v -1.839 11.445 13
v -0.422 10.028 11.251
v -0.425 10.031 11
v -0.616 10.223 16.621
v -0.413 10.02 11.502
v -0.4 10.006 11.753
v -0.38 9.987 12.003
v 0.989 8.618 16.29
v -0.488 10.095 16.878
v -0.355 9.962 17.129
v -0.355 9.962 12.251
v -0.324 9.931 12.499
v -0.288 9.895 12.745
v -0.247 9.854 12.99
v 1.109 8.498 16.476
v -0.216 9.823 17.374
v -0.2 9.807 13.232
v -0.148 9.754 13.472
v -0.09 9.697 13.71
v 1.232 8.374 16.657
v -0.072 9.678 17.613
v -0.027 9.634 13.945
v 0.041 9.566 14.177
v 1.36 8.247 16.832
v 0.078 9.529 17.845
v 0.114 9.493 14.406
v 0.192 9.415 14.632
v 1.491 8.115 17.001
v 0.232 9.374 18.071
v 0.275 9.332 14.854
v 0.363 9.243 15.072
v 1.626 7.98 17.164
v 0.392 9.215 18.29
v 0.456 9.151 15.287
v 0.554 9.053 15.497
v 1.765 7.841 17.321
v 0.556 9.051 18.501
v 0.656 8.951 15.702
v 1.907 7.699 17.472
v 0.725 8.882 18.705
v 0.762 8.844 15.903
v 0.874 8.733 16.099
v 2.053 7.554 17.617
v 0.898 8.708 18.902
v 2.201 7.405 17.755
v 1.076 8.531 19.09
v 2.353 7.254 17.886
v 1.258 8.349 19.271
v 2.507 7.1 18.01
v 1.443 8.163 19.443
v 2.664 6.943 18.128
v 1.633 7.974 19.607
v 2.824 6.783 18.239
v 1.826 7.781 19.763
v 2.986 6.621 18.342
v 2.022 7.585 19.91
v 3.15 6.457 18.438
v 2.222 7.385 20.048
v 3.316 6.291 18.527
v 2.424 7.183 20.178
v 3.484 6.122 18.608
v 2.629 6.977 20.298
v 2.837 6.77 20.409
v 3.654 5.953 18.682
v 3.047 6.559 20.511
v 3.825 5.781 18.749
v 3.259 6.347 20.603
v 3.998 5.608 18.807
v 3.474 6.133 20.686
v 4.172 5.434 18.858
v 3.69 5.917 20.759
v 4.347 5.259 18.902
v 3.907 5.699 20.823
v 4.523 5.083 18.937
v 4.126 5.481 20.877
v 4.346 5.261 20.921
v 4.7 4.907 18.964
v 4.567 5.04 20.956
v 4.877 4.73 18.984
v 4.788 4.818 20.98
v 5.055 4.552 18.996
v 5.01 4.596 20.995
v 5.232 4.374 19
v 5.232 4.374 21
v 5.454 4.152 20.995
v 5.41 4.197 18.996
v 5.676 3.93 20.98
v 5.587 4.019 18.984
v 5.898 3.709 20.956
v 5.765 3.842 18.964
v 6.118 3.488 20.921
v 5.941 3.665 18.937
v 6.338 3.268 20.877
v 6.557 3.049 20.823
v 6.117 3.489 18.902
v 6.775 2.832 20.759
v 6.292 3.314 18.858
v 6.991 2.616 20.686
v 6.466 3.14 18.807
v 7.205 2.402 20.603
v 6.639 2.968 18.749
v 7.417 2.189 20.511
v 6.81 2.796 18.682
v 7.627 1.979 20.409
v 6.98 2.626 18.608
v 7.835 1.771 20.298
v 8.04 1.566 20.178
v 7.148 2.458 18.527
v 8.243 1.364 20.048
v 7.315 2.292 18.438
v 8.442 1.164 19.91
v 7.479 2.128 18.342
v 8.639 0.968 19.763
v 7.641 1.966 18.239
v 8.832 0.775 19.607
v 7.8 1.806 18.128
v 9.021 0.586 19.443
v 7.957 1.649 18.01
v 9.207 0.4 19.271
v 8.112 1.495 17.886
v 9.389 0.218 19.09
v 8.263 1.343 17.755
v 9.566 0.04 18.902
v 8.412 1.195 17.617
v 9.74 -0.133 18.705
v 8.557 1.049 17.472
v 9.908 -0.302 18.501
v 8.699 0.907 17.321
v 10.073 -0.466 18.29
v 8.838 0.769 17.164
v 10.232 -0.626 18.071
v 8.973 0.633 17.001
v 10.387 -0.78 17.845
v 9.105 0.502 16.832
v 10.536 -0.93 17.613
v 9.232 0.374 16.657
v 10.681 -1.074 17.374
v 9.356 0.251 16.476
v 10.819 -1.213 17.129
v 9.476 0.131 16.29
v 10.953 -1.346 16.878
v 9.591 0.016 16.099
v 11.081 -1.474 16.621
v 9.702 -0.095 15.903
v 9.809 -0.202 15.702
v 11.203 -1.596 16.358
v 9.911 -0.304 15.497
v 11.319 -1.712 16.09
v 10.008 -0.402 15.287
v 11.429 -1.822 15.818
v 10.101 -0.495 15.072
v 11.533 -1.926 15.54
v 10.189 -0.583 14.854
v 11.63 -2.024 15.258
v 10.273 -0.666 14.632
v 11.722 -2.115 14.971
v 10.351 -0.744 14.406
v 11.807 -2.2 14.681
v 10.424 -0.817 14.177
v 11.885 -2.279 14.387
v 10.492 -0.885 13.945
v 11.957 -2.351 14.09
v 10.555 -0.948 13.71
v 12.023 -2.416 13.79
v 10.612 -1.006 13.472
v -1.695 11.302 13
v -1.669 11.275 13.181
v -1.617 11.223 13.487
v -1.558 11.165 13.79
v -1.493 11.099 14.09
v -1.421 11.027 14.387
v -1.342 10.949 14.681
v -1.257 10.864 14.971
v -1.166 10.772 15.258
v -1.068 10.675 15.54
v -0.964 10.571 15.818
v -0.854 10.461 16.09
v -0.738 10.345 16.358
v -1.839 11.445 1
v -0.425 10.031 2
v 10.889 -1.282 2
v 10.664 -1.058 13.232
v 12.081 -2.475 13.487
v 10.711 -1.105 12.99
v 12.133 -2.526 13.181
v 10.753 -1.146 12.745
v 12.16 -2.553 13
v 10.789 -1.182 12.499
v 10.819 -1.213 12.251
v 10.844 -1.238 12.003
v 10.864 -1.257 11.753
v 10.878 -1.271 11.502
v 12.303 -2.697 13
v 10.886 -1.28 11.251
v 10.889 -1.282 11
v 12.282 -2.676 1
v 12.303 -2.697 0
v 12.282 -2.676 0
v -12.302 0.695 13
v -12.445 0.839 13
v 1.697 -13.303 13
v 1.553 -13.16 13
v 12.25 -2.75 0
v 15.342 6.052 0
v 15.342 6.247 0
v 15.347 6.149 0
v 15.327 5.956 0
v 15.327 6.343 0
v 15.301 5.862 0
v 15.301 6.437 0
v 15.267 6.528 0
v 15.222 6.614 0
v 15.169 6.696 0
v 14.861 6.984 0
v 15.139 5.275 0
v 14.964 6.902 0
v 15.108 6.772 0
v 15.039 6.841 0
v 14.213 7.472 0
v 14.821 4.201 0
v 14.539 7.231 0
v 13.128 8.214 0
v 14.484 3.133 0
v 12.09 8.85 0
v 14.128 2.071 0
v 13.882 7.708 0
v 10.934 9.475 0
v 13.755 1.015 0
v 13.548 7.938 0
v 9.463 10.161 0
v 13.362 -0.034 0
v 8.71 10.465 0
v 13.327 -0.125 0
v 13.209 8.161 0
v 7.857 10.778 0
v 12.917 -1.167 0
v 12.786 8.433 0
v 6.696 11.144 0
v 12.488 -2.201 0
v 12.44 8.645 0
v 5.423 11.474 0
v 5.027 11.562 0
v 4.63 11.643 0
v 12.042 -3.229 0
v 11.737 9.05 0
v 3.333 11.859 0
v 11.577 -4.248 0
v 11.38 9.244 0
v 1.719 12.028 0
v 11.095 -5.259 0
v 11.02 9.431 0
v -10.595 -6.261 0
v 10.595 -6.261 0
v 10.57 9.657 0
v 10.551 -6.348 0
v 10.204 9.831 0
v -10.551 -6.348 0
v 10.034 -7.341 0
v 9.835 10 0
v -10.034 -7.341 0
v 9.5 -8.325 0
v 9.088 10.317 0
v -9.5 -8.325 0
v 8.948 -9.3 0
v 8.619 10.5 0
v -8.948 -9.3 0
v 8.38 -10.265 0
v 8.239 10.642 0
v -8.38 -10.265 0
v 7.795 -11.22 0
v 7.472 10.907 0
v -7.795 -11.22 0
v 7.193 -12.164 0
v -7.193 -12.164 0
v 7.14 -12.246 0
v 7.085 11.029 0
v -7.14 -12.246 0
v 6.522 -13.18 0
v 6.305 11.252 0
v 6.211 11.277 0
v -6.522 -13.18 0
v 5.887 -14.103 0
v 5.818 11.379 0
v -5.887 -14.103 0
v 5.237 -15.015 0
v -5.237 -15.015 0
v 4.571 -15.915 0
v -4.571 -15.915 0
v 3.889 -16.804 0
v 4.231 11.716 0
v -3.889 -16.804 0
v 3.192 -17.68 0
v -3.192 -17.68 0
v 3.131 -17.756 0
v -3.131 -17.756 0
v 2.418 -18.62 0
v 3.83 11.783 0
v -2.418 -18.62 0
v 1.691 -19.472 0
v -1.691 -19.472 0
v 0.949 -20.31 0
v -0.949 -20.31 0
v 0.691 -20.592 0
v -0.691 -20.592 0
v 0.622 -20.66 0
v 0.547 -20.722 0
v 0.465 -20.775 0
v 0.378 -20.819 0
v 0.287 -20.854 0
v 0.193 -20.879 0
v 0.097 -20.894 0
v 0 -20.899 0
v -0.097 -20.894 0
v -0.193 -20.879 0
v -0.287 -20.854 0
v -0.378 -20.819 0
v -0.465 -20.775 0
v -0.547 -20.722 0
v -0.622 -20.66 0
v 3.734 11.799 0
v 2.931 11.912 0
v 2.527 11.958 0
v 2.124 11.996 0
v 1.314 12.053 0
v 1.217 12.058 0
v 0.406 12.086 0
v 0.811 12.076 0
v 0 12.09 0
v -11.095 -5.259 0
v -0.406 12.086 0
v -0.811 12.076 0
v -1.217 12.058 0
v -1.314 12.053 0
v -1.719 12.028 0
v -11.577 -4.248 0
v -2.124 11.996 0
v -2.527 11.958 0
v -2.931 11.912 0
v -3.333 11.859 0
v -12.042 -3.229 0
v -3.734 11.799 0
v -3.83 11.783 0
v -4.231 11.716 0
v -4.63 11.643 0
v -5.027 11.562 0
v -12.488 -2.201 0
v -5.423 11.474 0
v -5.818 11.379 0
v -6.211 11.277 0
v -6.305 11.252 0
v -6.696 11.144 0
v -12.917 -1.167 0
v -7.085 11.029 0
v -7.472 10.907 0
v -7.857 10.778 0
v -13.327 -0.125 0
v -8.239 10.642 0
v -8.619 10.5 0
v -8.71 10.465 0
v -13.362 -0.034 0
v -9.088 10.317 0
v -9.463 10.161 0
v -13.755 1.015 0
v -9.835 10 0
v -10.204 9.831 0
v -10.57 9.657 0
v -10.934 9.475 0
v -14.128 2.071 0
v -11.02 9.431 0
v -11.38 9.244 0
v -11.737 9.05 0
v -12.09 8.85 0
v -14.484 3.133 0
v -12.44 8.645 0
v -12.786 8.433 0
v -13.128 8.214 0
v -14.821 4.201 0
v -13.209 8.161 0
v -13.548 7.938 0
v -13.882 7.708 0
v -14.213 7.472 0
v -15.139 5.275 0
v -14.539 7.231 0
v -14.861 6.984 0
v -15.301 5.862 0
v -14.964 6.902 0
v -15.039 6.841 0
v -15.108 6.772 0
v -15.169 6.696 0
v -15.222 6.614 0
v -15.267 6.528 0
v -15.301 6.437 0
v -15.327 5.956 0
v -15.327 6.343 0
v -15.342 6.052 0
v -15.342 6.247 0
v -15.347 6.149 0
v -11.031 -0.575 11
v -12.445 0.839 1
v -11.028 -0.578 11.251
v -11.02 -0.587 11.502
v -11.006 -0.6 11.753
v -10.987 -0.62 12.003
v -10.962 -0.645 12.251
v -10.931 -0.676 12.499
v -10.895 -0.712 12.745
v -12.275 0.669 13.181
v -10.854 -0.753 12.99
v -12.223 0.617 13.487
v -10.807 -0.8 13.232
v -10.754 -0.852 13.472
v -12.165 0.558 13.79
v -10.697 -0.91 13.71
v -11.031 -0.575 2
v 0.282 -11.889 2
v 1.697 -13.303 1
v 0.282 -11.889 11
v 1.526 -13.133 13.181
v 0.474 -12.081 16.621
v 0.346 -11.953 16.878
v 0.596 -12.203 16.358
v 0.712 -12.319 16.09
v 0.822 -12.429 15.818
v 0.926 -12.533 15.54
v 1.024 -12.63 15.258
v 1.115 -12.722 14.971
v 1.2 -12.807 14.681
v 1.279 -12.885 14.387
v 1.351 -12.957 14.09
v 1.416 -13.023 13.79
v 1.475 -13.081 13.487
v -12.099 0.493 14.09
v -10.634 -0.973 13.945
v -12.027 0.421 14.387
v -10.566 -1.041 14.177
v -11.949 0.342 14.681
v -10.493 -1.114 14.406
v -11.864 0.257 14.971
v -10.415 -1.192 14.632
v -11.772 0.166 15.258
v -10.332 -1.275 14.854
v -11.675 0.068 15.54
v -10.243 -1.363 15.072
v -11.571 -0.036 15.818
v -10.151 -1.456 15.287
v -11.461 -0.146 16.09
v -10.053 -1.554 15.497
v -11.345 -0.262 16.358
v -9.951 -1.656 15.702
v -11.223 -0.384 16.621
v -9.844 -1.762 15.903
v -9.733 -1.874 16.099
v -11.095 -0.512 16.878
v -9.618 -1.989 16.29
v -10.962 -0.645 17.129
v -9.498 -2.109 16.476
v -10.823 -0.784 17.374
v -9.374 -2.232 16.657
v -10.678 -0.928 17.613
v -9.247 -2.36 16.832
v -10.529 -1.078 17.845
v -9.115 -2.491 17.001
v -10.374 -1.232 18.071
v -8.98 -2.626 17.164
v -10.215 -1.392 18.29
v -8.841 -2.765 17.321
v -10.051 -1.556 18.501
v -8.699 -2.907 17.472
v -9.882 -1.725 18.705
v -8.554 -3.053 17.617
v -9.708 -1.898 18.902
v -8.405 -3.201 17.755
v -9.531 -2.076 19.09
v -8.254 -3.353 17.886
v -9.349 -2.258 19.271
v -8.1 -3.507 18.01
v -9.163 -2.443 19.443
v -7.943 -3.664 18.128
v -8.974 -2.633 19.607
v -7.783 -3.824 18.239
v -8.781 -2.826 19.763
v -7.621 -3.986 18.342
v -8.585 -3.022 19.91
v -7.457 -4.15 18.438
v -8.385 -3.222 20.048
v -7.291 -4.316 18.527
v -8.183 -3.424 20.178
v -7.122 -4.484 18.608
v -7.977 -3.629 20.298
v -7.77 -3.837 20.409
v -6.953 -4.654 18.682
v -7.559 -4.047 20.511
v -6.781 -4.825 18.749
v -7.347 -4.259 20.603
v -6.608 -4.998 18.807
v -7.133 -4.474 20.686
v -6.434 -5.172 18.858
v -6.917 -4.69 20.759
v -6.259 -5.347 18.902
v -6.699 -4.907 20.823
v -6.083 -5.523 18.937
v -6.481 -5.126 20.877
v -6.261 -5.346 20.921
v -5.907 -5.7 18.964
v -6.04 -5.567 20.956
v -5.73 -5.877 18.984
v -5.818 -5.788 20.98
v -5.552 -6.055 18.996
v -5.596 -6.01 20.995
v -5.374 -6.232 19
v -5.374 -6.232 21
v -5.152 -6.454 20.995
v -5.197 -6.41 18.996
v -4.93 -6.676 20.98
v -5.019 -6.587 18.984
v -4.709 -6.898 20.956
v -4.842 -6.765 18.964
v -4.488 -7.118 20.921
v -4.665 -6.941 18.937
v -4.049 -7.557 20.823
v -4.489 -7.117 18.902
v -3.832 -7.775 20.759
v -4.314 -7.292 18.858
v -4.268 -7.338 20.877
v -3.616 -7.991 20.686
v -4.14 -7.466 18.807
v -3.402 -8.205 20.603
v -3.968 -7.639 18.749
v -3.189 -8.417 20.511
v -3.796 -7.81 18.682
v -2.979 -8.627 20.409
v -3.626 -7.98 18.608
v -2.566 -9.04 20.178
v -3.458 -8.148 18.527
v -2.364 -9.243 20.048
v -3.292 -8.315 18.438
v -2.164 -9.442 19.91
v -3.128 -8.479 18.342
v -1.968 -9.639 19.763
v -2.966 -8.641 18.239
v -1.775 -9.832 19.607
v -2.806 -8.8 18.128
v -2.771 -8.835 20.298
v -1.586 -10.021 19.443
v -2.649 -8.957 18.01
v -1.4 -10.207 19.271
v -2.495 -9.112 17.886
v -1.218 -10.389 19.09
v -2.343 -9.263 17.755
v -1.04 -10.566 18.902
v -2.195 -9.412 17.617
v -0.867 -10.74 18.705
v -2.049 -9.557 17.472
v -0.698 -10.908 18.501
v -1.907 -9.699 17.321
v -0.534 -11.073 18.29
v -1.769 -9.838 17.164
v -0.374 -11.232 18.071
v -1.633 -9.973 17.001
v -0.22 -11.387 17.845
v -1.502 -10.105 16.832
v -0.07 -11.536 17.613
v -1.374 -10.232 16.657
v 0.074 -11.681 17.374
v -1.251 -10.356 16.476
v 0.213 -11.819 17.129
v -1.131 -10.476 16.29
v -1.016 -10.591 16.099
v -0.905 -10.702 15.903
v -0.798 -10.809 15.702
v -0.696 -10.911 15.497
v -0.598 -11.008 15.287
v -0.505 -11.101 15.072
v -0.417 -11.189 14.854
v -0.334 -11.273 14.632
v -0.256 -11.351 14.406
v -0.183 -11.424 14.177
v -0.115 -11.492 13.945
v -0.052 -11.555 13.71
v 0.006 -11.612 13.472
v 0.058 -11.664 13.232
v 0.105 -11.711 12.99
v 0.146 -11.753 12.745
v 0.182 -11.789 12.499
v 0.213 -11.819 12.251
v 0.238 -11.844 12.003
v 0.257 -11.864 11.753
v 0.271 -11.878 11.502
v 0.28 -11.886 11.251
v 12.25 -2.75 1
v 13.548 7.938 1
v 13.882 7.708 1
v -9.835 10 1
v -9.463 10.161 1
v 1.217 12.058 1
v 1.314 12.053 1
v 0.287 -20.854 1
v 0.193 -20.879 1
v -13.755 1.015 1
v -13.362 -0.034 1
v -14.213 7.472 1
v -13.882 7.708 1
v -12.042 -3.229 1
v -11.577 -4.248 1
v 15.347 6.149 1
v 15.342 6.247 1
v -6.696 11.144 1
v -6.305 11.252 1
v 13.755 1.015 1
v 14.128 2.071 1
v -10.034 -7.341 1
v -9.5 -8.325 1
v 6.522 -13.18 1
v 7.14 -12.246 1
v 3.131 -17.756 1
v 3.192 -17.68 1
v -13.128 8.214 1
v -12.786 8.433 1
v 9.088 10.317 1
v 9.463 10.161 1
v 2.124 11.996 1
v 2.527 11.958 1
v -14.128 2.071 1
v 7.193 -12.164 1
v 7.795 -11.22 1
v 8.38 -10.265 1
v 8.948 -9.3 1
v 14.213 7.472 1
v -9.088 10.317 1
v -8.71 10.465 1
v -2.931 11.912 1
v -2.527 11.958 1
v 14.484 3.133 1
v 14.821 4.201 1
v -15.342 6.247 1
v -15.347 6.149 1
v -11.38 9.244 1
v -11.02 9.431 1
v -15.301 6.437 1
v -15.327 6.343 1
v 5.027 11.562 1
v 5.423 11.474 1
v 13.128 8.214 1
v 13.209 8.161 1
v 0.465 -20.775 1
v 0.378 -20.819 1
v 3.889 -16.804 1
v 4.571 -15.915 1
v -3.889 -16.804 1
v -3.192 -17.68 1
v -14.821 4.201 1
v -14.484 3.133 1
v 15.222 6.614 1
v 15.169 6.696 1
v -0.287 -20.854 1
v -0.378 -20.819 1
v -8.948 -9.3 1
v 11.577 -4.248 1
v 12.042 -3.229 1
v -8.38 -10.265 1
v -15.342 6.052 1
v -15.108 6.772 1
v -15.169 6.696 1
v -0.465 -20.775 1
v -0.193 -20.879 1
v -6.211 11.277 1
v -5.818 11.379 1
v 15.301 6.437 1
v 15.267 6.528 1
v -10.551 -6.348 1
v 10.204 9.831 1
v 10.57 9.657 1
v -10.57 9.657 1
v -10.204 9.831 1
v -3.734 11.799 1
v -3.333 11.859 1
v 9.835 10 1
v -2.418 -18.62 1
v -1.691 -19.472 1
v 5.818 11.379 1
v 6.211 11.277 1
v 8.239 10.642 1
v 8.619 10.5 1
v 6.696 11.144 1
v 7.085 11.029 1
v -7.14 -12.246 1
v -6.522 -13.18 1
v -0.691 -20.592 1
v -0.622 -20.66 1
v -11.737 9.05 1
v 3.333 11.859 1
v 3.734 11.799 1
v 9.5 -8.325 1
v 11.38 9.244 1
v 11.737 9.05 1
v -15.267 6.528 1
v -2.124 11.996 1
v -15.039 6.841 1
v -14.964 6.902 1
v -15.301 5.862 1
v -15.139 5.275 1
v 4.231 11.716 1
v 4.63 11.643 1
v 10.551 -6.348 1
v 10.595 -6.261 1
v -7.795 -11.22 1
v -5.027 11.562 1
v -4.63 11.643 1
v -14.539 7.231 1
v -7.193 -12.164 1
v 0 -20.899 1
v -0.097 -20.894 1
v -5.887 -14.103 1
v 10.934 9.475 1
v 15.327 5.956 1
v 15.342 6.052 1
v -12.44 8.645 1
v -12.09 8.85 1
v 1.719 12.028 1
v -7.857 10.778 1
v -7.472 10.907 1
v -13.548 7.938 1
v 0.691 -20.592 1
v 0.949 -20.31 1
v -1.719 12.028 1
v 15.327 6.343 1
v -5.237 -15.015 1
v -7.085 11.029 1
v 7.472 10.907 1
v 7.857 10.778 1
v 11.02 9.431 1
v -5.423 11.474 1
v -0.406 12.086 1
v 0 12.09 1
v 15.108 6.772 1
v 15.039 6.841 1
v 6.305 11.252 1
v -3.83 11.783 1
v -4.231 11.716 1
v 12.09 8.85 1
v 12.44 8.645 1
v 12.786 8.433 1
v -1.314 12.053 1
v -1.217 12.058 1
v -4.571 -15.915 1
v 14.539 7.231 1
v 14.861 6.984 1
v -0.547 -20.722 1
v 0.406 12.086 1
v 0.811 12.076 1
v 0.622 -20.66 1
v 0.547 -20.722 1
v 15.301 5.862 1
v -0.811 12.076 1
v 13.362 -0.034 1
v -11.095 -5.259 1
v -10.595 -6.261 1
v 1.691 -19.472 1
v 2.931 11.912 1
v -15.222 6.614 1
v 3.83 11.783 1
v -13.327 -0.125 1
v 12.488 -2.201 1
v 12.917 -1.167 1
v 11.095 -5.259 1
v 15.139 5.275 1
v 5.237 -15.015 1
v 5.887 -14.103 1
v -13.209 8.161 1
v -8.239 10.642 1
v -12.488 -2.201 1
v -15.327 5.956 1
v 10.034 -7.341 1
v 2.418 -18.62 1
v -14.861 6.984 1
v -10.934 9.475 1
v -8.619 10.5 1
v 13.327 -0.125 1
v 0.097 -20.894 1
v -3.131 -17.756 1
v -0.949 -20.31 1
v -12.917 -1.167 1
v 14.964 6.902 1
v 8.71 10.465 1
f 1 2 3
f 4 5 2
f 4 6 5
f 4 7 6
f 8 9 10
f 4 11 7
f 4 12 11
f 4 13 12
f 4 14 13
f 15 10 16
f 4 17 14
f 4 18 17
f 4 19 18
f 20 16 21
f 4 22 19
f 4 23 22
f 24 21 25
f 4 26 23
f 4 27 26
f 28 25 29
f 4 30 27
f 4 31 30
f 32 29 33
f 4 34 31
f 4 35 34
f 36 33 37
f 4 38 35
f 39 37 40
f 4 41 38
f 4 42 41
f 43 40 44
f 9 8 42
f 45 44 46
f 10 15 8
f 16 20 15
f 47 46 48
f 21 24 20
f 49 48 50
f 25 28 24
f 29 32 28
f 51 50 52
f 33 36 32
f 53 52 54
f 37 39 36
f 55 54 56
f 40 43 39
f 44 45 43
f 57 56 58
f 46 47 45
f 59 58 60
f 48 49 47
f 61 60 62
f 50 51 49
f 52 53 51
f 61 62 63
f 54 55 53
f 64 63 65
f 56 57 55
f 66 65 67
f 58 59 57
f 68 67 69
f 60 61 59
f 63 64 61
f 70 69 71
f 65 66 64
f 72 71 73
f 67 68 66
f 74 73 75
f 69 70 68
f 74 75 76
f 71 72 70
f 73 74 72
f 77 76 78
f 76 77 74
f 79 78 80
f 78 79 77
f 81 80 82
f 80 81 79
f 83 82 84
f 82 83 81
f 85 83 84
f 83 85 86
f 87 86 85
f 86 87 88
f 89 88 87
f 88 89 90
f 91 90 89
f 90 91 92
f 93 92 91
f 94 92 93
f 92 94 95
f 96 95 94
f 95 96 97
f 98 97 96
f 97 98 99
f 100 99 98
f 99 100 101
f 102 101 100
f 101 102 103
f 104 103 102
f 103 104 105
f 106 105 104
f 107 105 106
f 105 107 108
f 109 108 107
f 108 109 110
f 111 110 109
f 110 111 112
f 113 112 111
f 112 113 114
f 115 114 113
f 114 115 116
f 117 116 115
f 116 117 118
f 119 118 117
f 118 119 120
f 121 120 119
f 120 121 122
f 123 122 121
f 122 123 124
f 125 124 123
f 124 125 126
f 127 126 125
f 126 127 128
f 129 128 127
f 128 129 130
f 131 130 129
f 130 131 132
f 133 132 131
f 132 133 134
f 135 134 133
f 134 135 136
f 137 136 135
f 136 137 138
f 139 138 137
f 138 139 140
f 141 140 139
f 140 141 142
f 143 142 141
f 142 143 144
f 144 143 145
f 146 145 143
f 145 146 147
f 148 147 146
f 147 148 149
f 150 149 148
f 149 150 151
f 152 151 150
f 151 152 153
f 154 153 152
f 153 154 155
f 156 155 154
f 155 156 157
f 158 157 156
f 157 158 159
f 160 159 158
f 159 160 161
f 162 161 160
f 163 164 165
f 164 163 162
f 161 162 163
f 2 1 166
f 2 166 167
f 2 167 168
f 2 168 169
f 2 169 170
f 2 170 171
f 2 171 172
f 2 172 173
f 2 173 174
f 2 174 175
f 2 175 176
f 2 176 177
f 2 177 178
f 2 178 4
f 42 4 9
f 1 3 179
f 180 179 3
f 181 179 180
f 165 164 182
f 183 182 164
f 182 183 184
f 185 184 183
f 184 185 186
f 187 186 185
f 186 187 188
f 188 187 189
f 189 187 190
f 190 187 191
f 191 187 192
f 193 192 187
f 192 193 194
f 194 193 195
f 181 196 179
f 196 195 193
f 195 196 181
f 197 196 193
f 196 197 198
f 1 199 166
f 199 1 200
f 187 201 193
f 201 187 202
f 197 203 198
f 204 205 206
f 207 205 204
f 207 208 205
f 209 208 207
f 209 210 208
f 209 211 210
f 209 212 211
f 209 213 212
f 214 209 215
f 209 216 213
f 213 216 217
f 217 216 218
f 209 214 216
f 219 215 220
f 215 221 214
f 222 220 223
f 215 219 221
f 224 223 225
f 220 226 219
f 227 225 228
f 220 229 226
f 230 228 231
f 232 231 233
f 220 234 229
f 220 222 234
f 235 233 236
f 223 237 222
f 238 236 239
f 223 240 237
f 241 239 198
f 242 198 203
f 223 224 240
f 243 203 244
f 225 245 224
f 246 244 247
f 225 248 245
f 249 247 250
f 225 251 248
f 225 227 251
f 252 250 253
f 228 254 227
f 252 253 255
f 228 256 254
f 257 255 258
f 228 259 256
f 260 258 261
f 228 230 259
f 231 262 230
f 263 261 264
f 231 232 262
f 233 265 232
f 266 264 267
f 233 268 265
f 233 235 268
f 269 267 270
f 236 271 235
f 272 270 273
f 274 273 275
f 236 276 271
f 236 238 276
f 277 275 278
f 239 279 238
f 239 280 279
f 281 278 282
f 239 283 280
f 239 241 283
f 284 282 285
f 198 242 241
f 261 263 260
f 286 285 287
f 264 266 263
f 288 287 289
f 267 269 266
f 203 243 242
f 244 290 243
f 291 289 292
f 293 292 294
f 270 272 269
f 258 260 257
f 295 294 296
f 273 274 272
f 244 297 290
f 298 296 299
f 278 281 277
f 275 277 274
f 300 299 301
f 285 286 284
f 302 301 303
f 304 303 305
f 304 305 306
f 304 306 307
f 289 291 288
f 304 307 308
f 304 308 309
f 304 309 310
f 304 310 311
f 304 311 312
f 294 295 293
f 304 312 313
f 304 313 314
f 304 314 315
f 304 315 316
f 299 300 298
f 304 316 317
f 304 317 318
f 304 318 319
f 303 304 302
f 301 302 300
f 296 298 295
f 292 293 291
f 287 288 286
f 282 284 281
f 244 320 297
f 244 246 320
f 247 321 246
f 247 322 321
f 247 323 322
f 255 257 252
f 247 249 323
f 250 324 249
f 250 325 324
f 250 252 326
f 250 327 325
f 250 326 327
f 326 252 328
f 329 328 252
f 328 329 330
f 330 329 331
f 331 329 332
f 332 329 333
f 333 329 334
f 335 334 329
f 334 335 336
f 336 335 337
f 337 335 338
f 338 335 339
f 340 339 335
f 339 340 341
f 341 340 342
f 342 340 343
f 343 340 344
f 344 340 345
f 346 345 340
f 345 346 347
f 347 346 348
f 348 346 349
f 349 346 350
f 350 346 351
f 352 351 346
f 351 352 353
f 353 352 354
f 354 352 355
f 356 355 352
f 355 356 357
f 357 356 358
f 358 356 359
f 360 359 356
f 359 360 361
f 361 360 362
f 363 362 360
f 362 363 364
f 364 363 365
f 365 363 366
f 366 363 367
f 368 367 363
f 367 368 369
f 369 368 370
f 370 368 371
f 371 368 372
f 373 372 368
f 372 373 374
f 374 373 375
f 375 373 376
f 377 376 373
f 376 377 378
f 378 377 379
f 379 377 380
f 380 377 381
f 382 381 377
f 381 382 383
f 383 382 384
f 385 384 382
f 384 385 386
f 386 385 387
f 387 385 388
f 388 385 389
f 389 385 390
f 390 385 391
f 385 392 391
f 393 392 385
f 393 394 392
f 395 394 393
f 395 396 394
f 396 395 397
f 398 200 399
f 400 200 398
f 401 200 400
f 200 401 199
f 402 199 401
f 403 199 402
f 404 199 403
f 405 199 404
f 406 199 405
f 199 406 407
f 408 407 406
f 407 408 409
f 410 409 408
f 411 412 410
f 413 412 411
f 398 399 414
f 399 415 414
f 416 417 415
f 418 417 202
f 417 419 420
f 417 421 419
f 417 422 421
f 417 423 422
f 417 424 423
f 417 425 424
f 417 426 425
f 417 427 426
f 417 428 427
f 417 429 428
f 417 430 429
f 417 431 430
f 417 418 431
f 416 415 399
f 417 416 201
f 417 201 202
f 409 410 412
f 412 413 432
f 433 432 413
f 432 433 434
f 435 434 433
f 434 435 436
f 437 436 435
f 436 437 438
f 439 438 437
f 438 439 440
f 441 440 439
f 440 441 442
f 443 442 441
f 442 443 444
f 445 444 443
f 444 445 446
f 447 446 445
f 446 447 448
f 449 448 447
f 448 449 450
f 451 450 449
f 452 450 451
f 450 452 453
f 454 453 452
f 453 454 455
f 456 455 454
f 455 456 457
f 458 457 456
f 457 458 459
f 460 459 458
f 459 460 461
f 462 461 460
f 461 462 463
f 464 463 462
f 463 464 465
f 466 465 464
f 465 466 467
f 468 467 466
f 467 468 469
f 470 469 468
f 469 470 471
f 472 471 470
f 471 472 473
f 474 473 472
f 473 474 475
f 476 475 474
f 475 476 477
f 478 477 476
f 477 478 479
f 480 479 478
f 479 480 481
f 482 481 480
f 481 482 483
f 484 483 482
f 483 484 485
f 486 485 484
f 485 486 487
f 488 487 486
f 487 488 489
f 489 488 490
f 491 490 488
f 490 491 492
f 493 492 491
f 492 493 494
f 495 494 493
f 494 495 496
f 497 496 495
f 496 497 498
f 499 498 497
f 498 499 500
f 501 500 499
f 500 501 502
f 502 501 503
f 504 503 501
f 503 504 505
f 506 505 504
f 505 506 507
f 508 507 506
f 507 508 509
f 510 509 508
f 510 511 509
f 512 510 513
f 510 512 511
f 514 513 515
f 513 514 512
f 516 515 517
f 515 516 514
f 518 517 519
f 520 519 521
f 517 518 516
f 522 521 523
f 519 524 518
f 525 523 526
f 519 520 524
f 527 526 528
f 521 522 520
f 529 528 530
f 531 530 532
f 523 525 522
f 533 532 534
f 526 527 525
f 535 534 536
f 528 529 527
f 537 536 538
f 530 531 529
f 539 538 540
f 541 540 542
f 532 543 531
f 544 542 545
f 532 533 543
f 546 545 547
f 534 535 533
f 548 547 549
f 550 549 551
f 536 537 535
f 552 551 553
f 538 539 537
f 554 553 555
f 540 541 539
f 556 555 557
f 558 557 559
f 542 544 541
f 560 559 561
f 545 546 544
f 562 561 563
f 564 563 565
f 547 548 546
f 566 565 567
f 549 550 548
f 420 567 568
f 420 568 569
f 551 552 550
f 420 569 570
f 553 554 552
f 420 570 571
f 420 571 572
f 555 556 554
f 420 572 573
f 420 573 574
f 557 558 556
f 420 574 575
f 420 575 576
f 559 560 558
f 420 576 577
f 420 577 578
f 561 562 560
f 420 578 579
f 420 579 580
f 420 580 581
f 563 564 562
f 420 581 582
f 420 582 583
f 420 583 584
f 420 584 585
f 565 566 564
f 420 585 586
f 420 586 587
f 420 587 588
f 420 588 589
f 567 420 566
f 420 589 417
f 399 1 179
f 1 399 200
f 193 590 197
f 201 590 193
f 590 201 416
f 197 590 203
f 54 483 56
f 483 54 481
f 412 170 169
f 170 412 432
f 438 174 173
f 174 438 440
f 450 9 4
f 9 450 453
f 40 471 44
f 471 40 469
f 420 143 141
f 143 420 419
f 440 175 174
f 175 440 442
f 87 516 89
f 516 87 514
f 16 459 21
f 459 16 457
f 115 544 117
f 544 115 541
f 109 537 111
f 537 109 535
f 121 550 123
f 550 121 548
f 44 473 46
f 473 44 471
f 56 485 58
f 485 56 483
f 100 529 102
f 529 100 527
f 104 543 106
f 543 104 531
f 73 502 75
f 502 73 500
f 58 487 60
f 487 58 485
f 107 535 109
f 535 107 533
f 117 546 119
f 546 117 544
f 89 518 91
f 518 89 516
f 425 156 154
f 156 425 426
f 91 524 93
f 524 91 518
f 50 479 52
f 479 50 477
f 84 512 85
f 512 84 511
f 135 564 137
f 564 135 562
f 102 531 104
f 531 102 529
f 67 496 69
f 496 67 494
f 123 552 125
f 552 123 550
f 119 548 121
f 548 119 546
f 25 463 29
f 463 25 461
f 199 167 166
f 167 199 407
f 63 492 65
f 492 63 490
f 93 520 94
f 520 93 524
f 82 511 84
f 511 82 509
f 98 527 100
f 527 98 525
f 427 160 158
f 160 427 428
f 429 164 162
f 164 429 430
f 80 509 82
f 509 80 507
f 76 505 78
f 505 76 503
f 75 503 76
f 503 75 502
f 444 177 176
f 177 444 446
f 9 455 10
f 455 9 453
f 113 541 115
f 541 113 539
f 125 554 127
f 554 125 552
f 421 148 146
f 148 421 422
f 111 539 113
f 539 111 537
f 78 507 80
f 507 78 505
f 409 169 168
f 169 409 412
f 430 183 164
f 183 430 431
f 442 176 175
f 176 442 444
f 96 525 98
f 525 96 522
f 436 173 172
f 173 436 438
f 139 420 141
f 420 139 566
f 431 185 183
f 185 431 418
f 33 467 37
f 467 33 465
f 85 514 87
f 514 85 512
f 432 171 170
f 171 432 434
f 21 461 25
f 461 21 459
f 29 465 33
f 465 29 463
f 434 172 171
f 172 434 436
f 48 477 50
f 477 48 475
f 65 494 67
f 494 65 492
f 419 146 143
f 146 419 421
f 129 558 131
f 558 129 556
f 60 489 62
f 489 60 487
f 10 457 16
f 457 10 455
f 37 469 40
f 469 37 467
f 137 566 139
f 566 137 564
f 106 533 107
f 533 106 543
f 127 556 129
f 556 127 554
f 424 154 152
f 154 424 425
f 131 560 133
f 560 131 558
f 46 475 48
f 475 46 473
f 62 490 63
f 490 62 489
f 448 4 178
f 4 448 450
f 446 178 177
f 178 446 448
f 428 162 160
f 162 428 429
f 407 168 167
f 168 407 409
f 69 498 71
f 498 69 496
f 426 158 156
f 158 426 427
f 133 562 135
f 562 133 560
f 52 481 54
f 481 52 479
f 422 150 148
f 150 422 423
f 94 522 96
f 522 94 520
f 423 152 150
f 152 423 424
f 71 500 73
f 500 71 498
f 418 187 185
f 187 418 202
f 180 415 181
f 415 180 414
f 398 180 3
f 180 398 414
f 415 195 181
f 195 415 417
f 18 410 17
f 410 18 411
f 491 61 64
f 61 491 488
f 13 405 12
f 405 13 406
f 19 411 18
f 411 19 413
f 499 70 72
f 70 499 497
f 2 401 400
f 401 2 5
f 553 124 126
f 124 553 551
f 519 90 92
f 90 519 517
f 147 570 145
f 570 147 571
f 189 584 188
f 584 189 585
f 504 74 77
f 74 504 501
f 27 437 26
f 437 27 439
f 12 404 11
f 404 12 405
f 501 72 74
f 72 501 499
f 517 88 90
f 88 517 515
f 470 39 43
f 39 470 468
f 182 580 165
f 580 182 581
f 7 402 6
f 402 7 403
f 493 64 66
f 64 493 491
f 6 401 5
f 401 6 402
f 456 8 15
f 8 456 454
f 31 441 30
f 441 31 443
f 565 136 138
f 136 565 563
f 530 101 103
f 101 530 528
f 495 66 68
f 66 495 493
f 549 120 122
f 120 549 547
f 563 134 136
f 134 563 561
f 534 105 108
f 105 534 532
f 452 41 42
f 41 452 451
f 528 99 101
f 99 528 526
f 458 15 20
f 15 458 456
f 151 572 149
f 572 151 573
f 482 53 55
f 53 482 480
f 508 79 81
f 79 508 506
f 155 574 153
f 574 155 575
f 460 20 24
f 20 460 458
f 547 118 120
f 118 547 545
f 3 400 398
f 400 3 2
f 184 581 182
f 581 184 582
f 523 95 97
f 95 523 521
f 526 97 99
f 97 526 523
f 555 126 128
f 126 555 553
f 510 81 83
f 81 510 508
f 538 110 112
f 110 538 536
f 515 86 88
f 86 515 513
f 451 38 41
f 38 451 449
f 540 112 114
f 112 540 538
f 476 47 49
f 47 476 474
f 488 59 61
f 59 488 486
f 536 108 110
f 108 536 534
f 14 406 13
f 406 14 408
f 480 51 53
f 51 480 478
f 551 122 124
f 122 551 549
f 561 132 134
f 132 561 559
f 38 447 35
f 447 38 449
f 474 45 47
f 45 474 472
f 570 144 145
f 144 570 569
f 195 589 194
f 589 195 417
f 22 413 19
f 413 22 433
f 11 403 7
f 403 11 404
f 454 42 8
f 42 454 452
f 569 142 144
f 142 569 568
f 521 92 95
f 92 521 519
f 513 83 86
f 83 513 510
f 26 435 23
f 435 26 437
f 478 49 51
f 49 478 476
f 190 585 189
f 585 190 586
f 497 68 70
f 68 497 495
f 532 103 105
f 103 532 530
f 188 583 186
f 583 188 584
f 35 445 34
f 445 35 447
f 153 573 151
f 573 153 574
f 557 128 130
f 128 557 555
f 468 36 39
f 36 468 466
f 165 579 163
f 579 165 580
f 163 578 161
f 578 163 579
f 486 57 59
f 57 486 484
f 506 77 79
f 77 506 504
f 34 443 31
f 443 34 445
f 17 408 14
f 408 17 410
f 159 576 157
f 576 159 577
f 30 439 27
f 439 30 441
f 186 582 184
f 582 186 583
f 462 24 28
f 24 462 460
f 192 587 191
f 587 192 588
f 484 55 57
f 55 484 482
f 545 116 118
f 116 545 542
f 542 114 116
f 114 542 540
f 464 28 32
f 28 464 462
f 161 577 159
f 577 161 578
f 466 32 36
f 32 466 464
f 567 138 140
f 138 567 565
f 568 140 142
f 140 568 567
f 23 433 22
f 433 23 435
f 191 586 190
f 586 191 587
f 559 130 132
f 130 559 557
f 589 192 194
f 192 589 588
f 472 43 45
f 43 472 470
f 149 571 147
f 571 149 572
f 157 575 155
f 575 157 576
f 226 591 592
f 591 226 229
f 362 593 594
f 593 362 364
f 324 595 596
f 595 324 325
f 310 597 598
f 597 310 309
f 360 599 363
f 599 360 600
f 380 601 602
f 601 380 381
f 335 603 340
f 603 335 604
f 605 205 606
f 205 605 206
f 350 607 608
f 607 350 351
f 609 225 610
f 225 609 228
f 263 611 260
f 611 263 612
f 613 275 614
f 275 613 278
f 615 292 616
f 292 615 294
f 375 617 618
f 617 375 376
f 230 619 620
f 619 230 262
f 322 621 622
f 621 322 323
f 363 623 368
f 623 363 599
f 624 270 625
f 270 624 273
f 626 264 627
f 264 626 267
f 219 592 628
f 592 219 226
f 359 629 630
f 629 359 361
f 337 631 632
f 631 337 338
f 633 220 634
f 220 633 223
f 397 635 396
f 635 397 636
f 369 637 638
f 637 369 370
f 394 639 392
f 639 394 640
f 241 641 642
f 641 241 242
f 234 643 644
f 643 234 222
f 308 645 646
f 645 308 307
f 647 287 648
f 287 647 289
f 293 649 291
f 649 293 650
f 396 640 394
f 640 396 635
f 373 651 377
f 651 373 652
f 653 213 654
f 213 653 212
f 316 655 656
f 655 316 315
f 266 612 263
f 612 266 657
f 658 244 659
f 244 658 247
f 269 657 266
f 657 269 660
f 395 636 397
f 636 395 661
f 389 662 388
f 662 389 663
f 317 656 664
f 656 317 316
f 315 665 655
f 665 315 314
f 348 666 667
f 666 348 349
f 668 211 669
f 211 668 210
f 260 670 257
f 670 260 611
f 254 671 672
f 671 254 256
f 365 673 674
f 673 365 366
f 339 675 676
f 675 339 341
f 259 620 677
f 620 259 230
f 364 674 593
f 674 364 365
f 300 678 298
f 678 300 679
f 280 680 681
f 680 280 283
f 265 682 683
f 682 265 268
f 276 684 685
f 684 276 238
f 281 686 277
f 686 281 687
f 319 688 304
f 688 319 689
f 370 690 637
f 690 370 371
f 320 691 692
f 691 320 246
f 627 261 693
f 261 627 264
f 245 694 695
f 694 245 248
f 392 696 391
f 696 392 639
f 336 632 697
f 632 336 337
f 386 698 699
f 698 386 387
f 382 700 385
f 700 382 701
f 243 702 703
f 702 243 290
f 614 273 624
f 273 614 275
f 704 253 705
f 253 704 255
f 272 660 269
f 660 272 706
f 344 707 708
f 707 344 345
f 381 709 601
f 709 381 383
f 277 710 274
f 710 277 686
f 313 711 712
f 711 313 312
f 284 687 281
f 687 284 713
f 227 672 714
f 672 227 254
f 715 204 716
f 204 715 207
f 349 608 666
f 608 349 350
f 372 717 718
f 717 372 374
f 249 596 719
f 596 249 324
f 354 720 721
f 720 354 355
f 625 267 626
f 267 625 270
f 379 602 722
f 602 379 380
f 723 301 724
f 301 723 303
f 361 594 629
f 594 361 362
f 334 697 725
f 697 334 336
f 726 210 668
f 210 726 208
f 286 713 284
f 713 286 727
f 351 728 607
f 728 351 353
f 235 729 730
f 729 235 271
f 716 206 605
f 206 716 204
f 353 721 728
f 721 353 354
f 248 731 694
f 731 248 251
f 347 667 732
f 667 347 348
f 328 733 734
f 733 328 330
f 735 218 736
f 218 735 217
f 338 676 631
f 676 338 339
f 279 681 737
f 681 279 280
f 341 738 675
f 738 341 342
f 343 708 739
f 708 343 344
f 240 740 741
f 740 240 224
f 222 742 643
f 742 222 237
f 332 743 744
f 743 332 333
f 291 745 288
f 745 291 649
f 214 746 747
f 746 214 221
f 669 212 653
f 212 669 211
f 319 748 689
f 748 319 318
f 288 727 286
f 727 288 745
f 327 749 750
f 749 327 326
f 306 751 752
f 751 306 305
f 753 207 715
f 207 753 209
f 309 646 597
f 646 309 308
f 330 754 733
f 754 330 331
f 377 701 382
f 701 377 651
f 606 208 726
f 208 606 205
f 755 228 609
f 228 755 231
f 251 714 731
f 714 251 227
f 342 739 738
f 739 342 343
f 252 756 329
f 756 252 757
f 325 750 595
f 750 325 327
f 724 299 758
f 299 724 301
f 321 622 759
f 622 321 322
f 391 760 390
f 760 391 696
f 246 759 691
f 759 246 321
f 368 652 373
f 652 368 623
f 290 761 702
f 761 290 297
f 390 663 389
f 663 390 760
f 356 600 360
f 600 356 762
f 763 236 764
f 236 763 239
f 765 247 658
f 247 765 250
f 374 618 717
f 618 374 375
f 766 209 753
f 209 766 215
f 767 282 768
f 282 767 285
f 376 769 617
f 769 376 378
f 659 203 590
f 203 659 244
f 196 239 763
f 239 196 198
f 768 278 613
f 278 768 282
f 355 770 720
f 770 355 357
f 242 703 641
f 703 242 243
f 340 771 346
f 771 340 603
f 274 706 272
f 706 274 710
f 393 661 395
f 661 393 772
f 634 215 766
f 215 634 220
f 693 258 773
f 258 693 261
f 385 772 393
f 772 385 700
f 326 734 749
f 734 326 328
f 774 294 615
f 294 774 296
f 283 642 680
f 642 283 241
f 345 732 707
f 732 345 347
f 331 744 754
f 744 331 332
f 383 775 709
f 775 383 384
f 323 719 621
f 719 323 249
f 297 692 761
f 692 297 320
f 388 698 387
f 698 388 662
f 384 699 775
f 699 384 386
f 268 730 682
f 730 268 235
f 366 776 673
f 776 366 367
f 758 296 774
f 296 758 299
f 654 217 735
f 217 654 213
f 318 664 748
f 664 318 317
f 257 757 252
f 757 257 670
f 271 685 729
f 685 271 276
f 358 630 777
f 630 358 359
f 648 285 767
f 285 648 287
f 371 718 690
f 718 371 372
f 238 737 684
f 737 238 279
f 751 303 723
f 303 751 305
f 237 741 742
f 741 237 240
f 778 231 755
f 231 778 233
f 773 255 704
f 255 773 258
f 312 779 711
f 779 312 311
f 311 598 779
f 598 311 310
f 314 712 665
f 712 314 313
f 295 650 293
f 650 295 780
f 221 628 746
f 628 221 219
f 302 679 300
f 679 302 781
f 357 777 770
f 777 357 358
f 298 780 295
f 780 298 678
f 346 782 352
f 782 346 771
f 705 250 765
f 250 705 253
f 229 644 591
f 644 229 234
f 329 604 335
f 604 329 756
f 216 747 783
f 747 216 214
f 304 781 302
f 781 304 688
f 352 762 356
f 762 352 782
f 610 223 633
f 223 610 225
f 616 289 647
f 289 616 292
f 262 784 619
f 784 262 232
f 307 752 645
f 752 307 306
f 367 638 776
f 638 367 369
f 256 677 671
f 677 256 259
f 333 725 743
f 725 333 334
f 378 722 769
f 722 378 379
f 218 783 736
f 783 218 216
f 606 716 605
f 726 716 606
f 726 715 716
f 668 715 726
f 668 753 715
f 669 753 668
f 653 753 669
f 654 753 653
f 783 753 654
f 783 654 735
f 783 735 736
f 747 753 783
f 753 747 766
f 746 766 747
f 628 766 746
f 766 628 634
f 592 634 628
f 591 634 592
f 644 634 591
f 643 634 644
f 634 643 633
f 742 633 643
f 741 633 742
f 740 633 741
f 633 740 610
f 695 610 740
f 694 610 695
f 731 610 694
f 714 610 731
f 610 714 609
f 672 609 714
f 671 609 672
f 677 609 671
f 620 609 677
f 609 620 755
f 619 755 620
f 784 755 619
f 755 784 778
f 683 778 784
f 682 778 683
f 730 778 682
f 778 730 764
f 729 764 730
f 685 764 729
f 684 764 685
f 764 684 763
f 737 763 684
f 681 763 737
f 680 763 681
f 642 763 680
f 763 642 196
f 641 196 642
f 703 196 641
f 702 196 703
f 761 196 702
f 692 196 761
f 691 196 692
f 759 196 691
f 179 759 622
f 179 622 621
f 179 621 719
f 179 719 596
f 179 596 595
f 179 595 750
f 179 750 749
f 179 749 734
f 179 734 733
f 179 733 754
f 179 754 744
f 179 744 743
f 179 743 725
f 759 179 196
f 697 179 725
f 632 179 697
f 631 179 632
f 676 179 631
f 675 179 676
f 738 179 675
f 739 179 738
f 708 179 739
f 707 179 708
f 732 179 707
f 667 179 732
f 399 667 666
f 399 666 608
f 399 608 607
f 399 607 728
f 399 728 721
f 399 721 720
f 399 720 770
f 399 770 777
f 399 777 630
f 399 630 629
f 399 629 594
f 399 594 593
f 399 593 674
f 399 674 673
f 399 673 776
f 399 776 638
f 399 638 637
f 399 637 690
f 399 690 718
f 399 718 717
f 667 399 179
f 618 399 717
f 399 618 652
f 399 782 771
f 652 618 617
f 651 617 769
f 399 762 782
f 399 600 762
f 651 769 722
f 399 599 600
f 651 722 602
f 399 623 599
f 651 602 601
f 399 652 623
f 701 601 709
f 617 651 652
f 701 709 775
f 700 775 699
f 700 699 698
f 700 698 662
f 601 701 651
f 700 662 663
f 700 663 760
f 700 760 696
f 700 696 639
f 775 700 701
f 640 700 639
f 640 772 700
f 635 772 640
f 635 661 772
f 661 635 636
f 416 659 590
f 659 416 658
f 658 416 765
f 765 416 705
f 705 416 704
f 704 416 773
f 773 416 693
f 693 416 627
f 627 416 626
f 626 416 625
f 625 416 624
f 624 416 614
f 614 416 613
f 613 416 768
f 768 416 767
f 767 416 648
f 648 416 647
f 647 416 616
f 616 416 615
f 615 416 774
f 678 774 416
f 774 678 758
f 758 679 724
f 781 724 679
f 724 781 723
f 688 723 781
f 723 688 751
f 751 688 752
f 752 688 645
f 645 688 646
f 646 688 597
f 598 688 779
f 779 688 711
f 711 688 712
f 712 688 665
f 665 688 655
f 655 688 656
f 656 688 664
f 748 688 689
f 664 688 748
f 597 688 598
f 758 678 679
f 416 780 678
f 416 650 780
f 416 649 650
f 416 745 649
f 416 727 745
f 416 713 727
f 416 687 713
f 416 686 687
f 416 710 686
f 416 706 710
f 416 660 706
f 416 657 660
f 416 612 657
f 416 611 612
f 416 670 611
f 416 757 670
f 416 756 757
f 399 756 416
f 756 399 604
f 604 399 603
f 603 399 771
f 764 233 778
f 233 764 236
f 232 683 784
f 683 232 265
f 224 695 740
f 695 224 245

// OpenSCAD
//	PickPerfect by LoGan McCarthy 3/07/2012 LM
// A thanks to OpenSCAD manual and MakerBlock Customizer Template for the tips and HarlanDMii for Write.scad.
$fn=200;



larg=15;
comp=16; // 14
esp=2;
alt=17;  // 17

//CUSTOMIZER VARIABLES

//	This section is displays the box options
//Pick Thickness 
z_thick = 2.5;	//	[1:Extra Lite, 1.5:Lite, 1.875:Medium, 2.5:Heavy, 3.75:Extra Heavy, 4.375:Extreme!]

//AdvancedGrip Technology
Grip = 0; // [1:Yes, 0:No]


//CUSTOMIZER VARIABLES END


translate([esp*3.5,0-esp*4,0]) // normal
rotate([0,0,45]) 

//anel
difference()
{
	union()
	{
		translate([0-larg/2,0,0])
		cube([larg,comp+esp*2,alt+esp*2-comp/2]);
		rotate([0,90,0])
		translate([0-alt+comp/2-esp,comp/2+esp,0-larg/2])
		cylinder(r=comp/2+esp,h=larg);		
	}
	union()
	{
		translate([0-larg/2-esp,esp,esp])
		cube([larg+esp*2,comp,alt-comp/2]);
		translate([0-larg/2,esp,esp])

		rotate([0,90,0])
		translate([0-alt+comp/2,comp/2,0-esp])
		cylinder(r=comp/2,h=larg+esp*2);		
	}
}


//PickPerfect


scale(v = [.93,.93, z_thick]) {

union() {
color("darkorange")

//error correct
	scale(v = [1,1,.8]) {
minkowski()
{

translate([0,25,0])
	
		intersection() {
			translate([-51,0,0]) cylinder($fn=360,.4,69,69);
			translate([51,0,0]) cylinder($fn=360,.4,69,69);
			translate([0,-38,0]) cylinder($fn=360,.4,25,25);
 }
 cylinder($fn=60,r=1,h=.1);}
}
}

//TOP GRIP
color("gold")

if(Grip==1){
translate([0,0,-1.61]) {
difference() {
translate([0,23,2])
	
		intersection() {
			translate([-51,0,0]) cylinder($fn=260,.2,67,66);
			translate([51,0,0]) cylinder($fn=260,.2,67,66);
			translate([0,-38,0]) cylinder($fn=260,.2,25,24);}

			translate([0,-15,0]) cylinder($fn=260,3,16,25);}
}


//BOTTOM GRIP
translate([0,-4,-1.61]) {
difference() {
translate([0,23,2])
	
		intersection() {
			translate([-51,0,0]) cylinder($fn=260,.2,65,64);
			translate([51,0,0]) cylinder($fn=260,.2,65,64);
			translate([0,-38,0]) cylinder($fn=260,.2,23,22);}

			translate([0,-15,0]) cylinder($fn=260,3,14,23);}
}
}

}
